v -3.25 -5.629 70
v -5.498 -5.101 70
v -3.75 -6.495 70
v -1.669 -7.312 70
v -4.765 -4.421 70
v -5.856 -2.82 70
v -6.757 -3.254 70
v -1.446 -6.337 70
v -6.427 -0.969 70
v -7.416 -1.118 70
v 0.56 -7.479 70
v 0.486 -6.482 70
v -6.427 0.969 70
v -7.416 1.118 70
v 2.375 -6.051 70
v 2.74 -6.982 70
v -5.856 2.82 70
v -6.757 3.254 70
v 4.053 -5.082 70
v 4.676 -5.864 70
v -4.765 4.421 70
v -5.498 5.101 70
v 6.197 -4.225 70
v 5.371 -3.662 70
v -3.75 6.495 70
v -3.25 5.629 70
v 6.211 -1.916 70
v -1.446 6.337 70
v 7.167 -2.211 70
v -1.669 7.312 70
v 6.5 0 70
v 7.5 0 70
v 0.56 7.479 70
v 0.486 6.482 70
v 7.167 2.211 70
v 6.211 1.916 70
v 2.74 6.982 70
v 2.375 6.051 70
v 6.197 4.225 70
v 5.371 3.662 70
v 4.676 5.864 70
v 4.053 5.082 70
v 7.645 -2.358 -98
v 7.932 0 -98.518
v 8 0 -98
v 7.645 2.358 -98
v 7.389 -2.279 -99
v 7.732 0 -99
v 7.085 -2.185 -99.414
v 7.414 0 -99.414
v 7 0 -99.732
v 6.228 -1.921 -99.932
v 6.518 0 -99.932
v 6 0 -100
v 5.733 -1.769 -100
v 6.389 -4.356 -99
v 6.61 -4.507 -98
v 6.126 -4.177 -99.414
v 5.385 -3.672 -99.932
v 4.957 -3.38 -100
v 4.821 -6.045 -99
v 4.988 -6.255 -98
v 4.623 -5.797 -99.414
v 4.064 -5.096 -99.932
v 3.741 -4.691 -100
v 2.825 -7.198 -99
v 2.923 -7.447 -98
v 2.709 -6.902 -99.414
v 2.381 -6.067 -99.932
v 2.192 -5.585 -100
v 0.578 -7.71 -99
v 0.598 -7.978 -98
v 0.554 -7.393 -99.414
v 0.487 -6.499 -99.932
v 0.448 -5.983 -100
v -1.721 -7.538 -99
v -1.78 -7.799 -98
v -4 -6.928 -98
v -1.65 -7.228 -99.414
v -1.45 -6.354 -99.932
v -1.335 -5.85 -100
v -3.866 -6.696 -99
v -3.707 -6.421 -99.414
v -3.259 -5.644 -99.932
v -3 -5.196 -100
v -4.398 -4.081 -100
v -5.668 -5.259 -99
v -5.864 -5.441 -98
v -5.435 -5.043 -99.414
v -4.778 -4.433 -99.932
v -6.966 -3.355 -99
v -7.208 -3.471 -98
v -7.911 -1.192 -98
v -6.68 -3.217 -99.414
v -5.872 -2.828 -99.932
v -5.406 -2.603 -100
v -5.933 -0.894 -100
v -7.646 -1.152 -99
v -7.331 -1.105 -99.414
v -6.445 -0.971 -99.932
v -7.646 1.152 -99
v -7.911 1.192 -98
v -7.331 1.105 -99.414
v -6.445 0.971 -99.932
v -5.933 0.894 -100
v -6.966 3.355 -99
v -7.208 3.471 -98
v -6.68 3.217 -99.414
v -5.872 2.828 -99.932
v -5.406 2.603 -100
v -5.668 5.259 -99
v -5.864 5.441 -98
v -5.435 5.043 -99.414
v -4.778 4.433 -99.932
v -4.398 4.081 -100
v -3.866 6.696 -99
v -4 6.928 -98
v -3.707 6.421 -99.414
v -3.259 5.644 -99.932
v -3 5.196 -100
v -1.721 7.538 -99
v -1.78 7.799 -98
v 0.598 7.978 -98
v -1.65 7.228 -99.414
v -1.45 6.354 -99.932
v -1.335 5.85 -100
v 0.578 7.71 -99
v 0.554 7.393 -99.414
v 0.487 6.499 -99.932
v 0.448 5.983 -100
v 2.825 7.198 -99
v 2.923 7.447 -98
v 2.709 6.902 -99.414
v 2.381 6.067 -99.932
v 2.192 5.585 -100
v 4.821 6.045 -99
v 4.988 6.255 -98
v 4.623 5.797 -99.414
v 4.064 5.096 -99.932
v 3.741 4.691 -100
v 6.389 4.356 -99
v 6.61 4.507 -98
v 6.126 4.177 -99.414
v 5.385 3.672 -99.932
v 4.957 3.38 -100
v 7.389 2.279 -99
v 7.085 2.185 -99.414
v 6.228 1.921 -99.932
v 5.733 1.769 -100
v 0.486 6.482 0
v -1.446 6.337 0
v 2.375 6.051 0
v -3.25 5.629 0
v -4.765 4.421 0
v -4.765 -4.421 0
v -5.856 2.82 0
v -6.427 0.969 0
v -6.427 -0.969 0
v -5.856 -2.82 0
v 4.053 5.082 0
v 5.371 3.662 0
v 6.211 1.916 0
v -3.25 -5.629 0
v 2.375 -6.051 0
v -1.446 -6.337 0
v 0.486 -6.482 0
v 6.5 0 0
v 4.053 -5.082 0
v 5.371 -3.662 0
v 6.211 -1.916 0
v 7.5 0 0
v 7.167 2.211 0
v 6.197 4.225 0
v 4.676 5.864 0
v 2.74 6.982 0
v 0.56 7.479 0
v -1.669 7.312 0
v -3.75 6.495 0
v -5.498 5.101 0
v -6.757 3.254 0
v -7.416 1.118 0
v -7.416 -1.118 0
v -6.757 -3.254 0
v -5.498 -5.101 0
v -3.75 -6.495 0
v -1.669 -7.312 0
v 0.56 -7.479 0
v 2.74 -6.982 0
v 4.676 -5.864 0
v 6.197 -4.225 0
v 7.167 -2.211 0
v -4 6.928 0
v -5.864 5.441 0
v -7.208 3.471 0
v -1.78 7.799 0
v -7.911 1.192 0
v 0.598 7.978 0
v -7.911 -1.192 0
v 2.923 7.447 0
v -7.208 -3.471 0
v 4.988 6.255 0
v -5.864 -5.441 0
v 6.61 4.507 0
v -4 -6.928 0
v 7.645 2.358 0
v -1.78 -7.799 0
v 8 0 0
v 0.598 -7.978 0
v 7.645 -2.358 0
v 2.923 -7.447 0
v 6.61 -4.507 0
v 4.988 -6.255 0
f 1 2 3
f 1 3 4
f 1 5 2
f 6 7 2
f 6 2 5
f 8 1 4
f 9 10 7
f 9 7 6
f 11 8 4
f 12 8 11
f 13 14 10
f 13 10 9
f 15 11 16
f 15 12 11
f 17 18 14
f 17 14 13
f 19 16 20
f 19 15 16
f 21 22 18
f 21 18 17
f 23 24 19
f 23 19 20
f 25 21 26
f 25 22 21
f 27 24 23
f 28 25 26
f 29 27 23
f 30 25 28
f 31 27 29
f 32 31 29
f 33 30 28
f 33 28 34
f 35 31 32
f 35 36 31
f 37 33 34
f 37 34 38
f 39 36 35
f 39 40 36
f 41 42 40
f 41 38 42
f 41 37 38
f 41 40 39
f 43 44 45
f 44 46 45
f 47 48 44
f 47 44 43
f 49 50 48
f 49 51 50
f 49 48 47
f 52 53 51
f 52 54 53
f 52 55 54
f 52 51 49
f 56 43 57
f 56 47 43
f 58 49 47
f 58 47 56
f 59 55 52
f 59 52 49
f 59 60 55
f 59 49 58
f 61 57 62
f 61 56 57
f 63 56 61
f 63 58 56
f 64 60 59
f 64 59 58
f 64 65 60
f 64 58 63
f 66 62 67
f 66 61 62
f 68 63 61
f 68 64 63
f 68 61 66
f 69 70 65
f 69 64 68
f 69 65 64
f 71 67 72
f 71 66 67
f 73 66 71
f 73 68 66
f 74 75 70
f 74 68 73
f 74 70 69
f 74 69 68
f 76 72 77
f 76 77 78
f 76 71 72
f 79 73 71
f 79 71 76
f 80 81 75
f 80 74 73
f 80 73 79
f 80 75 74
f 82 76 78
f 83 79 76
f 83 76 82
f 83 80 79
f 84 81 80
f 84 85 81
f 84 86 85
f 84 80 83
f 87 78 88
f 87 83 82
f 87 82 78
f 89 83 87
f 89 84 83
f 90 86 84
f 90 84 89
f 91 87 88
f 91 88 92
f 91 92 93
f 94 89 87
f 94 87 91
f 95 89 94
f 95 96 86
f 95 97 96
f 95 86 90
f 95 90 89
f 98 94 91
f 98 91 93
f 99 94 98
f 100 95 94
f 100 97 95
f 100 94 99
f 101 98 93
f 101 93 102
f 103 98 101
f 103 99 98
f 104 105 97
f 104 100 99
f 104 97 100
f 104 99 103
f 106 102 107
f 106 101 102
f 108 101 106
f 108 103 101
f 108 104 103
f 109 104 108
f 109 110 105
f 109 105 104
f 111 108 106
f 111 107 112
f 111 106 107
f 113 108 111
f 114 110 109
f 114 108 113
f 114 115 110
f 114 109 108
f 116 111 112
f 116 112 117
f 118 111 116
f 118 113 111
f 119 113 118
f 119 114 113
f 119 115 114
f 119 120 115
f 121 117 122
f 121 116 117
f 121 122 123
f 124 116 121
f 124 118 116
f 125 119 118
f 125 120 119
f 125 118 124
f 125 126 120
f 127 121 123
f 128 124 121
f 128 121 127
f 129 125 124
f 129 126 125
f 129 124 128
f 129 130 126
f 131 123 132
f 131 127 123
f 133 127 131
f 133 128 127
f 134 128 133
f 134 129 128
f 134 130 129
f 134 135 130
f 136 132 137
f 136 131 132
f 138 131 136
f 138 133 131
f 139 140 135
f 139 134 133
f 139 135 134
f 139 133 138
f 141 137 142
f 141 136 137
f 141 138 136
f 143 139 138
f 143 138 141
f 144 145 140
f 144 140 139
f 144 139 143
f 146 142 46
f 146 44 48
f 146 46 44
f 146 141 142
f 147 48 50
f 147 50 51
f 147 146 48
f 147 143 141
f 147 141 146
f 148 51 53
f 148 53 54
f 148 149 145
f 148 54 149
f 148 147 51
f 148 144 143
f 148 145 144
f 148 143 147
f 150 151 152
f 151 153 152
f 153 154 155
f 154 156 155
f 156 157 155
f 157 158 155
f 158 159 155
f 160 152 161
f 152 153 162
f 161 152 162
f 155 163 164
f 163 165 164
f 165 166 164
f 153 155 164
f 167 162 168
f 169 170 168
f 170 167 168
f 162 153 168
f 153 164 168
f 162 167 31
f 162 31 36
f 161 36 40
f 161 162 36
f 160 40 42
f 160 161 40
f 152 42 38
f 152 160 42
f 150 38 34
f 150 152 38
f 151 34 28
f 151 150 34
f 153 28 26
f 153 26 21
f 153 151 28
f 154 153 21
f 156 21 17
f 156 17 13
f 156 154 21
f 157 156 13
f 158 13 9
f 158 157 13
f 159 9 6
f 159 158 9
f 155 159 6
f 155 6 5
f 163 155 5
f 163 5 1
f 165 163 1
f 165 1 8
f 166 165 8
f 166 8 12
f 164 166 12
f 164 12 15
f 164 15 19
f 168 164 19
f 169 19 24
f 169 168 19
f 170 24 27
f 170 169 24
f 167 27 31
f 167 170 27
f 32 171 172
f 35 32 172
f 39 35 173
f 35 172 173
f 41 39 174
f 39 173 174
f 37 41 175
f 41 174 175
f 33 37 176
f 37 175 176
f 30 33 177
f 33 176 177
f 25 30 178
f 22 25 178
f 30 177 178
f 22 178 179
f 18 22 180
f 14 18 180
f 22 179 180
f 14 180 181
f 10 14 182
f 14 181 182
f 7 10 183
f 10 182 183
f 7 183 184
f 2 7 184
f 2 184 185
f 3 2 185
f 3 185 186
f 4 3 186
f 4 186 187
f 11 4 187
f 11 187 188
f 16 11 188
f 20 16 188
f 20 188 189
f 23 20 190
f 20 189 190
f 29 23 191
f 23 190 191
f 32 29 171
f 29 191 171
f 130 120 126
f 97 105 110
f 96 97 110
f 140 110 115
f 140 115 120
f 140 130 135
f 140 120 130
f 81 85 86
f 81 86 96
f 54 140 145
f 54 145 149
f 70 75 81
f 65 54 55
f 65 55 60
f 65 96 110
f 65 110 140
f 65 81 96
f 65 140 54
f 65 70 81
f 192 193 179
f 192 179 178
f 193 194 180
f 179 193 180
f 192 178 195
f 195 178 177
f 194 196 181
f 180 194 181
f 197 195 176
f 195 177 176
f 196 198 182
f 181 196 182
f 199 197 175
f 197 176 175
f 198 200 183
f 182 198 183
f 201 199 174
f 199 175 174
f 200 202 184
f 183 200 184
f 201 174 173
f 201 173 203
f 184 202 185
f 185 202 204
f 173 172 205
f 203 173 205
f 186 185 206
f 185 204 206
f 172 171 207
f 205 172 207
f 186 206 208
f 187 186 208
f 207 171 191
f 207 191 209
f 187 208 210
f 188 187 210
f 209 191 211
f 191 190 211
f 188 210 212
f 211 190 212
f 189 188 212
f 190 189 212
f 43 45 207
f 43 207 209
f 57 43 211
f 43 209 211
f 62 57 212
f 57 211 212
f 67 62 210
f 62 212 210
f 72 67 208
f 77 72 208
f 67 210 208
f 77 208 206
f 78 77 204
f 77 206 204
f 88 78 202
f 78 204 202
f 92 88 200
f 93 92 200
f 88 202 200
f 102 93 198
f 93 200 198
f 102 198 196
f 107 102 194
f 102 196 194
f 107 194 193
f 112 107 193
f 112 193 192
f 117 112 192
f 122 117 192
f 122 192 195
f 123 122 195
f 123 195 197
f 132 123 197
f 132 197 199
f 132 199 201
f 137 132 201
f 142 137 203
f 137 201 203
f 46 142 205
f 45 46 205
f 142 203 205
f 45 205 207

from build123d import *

# Parameters (mm, degrees)
F0_R     = 7.5
F0_R_2   = 6.5
F1_DEPTH = 70
F2_R     = 8
F3_DEPTH = 100
F4_R     = 2


with BuildPart() as f1:
    # F0 (on Top) → F1 (new body)
    with BuildSketch(Plane.XY):
        Circle(F0_R)
        Circle(F0_R_2, mode=Mode.SUBTRACT)
    extrude(amount=F1_DEPTH)

    # F2 (on face) → F3 (join)
    with BuildSketch(Plane(origin=(0, 0, 0), x_dir=(1, 0, 0), z_dir=(0, 0, -1))):
        Circle(F2_R)
    extrude(amount=F3_DEPTH)

    # F4
    f4_edges = [f1.edges().sort_by_distance(p)[0] for p in [
        (-8, 0, -100),
    ]]
    fillet(f4_edges, radius=F4_R)


solid = f1.part
